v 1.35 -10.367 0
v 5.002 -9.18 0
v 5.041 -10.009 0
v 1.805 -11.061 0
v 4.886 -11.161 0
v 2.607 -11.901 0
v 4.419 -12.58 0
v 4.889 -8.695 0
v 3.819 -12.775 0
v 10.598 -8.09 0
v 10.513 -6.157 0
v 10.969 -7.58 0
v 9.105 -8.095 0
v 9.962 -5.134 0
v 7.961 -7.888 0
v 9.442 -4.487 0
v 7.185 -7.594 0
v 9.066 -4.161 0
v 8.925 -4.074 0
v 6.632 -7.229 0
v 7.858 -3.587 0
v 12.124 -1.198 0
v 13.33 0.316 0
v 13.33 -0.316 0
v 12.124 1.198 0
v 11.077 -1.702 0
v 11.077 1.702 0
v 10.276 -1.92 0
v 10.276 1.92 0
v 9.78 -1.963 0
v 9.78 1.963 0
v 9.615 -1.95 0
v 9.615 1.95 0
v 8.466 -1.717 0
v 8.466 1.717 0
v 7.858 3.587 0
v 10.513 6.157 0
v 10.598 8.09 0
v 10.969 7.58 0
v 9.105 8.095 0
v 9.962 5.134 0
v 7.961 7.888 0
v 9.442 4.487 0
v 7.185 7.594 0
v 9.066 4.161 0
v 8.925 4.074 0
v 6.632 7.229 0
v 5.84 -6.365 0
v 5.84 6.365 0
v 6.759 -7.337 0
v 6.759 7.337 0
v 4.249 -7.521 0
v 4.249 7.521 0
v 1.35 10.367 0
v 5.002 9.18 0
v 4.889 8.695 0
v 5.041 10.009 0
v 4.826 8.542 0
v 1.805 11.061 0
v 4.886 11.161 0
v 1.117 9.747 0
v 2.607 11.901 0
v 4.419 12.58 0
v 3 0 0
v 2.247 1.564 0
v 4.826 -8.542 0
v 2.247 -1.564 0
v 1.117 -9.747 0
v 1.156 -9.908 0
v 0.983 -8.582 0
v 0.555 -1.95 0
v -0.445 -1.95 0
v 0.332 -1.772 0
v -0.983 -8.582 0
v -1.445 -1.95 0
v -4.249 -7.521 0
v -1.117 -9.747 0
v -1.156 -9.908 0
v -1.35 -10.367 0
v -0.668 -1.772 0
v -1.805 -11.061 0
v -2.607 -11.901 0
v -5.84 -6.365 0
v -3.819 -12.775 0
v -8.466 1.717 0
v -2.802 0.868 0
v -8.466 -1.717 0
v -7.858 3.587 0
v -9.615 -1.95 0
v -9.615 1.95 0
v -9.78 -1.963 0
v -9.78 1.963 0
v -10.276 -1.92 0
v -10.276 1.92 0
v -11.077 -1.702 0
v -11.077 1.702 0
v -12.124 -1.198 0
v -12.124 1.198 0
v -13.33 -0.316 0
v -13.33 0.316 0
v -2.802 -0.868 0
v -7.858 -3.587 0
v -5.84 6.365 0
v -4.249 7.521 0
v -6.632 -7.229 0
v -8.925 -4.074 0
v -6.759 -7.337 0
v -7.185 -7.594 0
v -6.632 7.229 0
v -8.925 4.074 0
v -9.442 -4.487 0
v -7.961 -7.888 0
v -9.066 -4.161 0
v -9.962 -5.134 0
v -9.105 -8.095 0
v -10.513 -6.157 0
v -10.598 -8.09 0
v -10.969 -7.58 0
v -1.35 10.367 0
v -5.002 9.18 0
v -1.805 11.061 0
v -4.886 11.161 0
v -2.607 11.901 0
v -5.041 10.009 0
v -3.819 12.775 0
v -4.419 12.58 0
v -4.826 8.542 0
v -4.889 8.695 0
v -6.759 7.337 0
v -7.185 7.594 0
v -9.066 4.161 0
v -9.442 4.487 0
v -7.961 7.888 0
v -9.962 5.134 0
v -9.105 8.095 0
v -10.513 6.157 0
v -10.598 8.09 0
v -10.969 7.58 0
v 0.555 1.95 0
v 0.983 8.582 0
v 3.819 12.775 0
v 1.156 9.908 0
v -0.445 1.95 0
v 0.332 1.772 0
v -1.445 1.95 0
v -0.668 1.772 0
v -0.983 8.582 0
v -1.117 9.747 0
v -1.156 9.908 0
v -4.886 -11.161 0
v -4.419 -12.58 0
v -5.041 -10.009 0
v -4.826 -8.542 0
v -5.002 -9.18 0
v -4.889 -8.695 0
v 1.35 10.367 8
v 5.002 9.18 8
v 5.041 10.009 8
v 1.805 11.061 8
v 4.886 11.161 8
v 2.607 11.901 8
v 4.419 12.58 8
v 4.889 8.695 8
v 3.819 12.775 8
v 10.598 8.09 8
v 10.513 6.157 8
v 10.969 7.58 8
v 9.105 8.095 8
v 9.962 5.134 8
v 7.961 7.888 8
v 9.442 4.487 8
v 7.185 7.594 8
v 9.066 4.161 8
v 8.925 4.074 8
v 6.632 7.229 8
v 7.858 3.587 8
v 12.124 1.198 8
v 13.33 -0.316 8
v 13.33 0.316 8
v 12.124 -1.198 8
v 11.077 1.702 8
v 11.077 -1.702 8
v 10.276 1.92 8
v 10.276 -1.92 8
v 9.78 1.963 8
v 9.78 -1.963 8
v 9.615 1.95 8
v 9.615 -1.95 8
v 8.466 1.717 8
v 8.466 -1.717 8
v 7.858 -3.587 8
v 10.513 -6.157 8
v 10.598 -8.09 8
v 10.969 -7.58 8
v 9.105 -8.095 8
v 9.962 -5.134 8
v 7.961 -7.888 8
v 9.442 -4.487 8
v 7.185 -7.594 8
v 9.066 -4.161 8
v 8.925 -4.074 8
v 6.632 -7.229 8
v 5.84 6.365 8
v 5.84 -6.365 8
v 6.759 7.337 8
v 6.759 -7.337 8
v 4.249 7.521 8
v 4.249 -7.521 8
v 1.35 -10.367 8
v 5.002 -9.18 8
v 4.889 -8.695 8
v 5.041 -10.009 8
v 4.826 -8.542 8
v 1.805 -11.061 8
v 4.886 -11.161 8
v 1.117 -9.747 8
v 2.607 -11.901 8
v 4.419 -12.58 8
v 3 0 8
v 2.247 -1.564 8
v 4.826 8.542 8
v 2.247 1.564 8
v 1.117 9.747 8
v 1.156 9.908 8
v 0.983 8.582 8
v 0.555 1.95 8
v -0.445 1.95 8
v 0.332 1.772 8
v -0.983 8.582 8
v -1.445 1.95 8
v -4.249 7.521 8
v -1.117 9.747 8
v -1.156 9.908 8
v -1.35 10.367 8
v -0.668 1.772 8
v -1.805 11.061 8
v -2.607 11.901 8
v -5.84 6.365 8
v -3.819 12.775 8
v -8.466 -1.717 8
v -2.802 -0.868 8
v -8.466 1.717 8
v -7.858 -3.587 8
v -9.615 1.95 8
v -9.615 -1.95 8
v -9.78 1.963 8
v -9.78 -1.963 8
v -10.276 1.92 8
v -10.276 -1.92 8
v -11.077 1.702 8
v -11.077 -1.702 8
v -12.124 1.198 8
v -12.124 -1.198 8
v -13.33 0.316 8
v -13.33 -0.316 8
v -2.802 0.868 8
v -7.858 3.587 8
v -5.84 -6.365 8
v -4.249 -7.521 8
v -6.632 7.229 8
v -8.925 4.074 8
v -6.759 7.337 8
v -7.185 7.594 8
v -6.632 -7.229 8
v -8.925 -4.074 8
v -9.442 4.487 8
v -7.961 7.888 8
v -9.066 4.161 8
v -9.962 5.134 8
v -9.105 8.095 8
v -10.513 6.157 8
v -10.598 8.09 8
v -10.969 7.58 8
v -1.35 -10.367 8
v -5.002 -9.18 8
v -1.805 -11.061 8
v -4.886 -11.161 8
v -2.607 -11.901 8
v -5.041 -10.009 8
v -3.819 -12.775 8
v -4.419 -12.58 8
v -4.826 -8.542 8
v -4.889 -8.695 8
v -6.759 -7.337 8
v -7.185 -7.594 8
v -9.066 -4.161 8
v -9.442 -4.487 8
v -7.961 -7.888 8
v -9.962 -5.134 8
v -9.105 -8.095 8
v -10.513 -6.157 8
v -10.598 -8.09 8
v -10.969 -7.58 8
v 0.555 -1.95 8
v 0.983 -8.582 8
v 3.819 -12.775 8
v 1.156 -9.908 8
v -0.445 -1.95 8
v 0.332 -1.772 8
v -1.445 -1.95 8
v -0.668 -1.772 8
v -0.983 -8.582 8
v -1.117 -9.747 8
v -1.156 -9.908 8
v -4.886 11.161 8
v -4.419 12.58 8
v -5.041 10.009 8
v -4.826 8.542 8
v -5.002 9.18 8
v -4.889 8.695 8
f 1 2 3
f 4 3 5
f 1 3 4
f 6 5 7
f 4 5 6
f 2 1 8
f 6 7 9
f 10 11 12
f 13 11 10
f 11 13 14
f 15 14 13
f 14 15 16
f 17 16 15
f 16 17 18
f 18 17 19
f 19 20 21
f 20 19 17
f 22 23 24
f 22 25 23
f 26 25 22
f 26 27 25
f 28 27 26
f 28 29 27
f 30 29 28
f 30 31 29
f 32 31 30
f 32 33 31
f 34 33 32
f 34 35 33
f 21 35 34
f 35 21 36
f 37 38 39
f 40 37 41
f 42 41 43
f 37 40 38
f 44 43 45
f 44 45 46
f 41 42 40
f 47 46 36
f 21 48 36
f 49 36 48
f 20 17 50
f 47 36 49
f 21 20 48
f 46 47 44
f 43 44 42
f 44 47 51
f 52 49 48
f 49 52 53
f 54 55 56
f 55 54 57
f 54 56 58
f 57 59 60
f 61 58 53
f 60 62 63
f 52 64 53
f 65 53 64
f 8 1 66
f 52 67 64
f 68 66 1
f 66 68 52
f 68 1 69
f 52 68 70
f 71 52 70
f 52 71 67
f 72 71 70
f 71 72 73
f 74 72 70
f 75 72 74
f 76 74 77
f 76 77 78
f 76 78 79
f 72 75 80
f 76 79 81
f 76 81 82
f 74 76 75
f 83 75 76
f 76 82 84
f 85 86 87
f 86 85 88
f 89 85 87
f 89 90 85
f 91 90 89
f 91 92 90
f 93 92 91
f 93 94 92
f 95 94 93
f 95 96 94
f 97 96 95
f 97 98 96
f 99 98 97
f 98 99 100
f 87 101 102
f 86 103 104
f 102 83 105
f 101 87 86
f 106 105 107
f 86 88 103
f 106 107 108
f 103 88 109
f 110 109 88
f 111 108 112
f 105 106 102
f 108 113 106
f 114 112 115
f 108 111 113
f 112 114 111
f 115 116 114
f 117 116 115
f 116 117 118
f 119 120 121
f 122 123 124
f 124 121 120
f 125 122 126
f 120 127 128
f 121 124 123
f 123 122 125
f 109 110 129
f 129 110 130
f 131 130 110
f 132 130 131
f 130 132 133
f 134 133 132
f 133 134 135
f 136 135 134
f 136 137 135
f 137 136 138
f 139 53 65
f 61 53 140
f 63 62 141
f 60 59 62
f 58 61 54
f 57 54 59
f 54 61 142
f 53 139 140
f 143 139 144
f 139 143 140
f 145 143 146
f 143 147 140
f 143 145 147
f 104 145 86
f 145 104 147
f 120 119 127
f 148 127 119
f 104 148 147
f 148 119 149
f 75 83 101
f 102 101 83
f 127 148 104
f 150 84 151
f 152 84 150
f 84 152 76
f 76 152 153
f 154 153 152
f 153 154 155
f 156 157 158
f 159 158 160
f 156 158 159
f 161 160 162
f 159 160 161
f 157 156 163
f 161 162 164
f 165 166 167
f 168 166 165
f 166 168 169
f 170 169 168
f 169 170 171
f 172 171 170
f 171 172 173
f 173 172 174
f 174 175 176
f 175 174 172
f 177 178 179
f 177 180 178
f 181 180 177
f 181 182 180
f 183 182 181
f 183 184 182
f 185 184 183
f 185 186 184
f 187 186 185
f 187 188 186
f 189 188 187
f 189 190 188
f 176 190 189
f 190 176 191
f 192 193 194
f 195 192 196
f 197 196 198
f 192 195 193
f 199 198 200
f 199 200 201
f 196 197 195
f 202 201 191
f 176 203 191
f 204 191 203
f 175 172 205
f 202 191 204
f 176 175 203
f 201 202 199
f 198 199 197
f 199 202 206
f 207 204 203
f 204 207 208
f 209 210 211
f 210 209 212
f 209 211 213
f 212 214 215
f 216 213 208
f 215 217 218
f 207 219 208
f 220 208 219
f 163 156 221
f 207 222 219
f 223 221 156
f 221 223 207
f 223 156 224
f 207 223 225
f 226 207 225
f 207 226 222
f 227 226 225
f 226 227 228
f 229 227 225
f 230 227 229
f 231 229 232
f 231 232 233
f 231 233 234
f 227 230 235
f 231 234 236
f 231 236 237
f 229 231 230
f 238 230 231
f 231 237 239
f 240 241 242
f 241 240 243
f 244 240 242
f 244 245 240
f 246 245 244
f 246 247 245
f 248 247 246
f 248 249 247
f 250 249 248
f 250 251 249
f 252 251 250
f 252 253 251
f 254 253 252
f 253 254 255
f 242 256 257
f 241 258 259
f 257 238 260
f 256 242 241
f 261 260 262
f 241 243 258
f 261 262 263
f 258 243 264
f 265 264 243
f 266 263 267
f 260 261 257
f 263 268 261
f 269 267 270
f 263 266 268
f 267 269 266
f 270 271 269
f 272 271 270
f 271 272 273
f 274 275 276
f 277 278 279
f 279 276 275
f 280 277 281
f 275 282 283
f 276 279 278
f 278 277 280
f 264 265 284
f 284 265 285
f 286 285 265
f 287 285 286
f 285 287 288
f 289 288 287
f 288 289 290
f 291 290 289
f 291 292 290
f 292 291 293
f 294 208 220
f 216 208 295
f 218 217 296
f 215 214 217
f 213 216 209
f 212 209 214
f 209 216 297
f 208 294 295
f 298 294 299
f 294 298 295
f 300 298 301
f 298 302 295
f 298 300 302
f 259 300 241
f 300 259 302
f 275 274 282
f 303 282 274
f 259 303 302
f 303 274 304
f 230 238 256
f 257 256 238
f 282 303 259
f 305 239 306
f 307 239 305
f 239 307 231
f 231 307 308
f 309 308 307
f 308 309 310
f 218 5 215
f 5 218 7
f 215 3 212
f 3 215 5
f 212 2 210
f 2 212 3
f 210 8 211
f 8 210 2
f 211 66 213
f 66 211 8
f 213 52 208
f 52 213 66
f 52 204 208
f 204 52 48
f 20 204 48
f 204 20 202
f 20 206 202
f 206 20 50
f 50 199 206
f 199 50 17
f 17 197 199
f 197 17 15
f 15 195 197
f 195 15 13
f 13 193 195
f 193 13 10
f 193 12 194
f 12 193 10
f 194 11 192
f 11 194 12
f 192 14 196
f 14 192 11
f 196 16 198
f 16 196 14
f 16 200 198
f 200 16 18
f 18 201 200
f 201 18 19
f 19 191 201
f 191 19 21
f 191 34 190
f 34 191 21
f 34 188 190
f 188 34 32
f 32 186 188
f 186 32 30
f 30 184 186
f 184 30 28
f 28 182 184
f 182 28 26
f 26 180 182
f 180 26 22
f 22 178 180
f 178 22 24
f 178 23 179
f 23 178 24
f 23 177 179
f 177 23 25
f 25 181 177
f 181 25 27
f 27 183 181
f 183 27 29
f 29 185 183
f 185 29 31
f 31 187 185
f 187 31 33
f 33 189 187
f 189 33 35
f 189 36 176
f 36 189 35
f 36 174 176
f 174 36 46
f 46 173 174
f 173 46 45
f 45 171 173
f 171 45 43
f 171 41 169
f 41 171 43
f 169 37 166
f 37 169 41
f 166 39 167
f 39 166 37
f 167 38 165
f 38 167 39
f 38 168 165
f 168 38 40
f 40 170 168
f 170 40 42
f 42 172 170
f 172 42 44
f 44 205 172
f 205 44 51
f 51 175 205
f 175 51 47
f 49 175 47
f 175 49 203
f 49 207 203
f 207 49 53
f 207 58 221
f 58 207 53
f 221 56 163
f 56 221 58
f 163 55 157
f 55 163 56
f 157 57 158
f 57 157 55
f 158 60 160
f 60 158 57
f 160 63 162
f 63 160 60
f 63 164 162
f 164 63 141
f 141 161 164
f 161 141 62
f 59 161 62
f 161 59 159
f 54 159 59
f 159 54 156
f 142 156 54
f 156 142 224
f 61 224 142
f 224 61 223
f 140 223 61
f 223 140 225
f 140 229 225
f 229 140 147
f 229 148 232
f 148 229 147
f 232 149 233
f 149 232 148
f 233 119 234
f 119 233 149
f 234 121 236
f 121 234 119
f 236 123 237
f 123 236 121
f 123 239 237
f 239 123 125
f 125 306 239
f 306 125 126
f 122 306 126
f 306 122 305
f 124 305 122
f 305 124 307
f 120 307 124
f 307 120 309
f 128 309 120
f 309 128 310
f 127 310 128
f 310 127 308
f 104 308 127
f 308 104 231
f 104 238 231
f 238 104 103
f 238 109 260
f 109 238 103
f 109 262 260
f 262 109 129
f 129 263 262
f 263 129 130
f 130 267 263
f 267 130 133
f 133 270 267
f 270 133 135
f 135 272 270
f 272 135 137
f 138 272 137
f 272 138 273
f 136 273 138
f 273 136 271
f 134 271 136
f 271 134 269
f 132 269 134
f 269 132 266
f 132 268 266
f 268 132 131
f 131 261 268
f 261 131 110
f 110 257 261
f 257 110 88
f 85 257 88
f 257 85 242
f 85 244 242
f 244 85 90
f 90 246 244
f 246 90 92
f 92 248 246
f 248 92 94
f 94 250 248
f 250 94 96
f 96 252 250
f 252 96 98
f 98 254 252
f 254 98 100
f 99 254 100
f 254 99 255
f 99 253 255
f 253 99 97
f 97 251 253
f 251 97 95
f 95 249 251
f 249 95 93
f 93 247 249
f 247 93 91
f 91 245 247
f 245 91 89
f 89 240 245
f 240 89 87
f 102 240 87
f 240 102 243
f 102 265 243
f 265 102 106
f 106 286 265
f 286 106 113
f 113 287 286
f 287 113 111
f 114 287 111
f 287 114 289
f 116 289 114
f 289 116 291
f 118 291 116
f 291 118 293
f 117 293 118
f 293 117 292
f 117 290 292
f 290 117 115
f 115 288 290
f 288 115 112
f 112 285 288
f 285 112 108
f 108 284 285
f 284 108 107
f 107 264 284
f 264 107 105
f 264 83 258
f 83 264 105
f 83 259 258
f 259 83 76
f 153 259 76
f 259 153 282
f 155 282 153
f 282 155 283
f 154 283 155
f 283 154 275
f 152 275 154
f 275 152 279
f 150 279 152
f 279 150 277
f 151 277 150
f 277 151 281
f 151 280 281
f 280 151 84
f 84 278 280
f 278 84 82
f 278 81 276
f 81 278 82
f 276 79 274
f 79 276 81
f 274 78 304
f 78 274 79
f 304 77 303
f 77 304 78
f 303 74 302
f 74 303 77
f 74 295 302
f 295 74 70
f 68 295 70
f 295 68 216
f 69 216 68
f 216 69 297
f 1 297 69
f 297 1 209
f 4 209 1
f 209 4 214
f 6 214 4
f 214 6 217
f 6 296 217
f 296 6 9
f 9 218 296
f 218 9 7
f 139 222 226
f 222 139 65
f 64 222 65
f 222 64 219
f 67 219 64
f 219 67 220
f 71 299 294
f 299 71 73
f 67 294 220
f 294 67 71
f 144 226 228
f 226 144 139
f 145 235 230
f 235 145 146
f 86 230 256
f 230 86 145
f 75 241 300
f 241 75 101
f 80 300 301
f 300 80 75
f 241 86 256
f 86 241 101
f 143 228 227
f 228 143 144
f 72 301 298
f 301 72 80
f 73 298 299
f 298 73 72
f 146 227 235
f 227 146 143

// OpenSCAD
use <MCAD/involute_gears.scad>
module stepper_mount(w=3) {
translate([1,0,0]) cylinder(
	h=50,
	d=w,
	center=true
	);
translate([-1,0,0]) cylinder(
	h=50,
	d=w,
	center=true
	);
cylinder(
	h=50,
	d=w,
	center=true
	);

}


difference() {
gear(
    number_of_teeth = 10,
    circular_pitch=400,
    hub_diameter = 7,
    bore_diameter = 1,
    gear_thickness = 8,
    rim_thickness = 8,
    hub_thickness = 6,
    circles=0);
stepper_mount(w=4);
};
;
